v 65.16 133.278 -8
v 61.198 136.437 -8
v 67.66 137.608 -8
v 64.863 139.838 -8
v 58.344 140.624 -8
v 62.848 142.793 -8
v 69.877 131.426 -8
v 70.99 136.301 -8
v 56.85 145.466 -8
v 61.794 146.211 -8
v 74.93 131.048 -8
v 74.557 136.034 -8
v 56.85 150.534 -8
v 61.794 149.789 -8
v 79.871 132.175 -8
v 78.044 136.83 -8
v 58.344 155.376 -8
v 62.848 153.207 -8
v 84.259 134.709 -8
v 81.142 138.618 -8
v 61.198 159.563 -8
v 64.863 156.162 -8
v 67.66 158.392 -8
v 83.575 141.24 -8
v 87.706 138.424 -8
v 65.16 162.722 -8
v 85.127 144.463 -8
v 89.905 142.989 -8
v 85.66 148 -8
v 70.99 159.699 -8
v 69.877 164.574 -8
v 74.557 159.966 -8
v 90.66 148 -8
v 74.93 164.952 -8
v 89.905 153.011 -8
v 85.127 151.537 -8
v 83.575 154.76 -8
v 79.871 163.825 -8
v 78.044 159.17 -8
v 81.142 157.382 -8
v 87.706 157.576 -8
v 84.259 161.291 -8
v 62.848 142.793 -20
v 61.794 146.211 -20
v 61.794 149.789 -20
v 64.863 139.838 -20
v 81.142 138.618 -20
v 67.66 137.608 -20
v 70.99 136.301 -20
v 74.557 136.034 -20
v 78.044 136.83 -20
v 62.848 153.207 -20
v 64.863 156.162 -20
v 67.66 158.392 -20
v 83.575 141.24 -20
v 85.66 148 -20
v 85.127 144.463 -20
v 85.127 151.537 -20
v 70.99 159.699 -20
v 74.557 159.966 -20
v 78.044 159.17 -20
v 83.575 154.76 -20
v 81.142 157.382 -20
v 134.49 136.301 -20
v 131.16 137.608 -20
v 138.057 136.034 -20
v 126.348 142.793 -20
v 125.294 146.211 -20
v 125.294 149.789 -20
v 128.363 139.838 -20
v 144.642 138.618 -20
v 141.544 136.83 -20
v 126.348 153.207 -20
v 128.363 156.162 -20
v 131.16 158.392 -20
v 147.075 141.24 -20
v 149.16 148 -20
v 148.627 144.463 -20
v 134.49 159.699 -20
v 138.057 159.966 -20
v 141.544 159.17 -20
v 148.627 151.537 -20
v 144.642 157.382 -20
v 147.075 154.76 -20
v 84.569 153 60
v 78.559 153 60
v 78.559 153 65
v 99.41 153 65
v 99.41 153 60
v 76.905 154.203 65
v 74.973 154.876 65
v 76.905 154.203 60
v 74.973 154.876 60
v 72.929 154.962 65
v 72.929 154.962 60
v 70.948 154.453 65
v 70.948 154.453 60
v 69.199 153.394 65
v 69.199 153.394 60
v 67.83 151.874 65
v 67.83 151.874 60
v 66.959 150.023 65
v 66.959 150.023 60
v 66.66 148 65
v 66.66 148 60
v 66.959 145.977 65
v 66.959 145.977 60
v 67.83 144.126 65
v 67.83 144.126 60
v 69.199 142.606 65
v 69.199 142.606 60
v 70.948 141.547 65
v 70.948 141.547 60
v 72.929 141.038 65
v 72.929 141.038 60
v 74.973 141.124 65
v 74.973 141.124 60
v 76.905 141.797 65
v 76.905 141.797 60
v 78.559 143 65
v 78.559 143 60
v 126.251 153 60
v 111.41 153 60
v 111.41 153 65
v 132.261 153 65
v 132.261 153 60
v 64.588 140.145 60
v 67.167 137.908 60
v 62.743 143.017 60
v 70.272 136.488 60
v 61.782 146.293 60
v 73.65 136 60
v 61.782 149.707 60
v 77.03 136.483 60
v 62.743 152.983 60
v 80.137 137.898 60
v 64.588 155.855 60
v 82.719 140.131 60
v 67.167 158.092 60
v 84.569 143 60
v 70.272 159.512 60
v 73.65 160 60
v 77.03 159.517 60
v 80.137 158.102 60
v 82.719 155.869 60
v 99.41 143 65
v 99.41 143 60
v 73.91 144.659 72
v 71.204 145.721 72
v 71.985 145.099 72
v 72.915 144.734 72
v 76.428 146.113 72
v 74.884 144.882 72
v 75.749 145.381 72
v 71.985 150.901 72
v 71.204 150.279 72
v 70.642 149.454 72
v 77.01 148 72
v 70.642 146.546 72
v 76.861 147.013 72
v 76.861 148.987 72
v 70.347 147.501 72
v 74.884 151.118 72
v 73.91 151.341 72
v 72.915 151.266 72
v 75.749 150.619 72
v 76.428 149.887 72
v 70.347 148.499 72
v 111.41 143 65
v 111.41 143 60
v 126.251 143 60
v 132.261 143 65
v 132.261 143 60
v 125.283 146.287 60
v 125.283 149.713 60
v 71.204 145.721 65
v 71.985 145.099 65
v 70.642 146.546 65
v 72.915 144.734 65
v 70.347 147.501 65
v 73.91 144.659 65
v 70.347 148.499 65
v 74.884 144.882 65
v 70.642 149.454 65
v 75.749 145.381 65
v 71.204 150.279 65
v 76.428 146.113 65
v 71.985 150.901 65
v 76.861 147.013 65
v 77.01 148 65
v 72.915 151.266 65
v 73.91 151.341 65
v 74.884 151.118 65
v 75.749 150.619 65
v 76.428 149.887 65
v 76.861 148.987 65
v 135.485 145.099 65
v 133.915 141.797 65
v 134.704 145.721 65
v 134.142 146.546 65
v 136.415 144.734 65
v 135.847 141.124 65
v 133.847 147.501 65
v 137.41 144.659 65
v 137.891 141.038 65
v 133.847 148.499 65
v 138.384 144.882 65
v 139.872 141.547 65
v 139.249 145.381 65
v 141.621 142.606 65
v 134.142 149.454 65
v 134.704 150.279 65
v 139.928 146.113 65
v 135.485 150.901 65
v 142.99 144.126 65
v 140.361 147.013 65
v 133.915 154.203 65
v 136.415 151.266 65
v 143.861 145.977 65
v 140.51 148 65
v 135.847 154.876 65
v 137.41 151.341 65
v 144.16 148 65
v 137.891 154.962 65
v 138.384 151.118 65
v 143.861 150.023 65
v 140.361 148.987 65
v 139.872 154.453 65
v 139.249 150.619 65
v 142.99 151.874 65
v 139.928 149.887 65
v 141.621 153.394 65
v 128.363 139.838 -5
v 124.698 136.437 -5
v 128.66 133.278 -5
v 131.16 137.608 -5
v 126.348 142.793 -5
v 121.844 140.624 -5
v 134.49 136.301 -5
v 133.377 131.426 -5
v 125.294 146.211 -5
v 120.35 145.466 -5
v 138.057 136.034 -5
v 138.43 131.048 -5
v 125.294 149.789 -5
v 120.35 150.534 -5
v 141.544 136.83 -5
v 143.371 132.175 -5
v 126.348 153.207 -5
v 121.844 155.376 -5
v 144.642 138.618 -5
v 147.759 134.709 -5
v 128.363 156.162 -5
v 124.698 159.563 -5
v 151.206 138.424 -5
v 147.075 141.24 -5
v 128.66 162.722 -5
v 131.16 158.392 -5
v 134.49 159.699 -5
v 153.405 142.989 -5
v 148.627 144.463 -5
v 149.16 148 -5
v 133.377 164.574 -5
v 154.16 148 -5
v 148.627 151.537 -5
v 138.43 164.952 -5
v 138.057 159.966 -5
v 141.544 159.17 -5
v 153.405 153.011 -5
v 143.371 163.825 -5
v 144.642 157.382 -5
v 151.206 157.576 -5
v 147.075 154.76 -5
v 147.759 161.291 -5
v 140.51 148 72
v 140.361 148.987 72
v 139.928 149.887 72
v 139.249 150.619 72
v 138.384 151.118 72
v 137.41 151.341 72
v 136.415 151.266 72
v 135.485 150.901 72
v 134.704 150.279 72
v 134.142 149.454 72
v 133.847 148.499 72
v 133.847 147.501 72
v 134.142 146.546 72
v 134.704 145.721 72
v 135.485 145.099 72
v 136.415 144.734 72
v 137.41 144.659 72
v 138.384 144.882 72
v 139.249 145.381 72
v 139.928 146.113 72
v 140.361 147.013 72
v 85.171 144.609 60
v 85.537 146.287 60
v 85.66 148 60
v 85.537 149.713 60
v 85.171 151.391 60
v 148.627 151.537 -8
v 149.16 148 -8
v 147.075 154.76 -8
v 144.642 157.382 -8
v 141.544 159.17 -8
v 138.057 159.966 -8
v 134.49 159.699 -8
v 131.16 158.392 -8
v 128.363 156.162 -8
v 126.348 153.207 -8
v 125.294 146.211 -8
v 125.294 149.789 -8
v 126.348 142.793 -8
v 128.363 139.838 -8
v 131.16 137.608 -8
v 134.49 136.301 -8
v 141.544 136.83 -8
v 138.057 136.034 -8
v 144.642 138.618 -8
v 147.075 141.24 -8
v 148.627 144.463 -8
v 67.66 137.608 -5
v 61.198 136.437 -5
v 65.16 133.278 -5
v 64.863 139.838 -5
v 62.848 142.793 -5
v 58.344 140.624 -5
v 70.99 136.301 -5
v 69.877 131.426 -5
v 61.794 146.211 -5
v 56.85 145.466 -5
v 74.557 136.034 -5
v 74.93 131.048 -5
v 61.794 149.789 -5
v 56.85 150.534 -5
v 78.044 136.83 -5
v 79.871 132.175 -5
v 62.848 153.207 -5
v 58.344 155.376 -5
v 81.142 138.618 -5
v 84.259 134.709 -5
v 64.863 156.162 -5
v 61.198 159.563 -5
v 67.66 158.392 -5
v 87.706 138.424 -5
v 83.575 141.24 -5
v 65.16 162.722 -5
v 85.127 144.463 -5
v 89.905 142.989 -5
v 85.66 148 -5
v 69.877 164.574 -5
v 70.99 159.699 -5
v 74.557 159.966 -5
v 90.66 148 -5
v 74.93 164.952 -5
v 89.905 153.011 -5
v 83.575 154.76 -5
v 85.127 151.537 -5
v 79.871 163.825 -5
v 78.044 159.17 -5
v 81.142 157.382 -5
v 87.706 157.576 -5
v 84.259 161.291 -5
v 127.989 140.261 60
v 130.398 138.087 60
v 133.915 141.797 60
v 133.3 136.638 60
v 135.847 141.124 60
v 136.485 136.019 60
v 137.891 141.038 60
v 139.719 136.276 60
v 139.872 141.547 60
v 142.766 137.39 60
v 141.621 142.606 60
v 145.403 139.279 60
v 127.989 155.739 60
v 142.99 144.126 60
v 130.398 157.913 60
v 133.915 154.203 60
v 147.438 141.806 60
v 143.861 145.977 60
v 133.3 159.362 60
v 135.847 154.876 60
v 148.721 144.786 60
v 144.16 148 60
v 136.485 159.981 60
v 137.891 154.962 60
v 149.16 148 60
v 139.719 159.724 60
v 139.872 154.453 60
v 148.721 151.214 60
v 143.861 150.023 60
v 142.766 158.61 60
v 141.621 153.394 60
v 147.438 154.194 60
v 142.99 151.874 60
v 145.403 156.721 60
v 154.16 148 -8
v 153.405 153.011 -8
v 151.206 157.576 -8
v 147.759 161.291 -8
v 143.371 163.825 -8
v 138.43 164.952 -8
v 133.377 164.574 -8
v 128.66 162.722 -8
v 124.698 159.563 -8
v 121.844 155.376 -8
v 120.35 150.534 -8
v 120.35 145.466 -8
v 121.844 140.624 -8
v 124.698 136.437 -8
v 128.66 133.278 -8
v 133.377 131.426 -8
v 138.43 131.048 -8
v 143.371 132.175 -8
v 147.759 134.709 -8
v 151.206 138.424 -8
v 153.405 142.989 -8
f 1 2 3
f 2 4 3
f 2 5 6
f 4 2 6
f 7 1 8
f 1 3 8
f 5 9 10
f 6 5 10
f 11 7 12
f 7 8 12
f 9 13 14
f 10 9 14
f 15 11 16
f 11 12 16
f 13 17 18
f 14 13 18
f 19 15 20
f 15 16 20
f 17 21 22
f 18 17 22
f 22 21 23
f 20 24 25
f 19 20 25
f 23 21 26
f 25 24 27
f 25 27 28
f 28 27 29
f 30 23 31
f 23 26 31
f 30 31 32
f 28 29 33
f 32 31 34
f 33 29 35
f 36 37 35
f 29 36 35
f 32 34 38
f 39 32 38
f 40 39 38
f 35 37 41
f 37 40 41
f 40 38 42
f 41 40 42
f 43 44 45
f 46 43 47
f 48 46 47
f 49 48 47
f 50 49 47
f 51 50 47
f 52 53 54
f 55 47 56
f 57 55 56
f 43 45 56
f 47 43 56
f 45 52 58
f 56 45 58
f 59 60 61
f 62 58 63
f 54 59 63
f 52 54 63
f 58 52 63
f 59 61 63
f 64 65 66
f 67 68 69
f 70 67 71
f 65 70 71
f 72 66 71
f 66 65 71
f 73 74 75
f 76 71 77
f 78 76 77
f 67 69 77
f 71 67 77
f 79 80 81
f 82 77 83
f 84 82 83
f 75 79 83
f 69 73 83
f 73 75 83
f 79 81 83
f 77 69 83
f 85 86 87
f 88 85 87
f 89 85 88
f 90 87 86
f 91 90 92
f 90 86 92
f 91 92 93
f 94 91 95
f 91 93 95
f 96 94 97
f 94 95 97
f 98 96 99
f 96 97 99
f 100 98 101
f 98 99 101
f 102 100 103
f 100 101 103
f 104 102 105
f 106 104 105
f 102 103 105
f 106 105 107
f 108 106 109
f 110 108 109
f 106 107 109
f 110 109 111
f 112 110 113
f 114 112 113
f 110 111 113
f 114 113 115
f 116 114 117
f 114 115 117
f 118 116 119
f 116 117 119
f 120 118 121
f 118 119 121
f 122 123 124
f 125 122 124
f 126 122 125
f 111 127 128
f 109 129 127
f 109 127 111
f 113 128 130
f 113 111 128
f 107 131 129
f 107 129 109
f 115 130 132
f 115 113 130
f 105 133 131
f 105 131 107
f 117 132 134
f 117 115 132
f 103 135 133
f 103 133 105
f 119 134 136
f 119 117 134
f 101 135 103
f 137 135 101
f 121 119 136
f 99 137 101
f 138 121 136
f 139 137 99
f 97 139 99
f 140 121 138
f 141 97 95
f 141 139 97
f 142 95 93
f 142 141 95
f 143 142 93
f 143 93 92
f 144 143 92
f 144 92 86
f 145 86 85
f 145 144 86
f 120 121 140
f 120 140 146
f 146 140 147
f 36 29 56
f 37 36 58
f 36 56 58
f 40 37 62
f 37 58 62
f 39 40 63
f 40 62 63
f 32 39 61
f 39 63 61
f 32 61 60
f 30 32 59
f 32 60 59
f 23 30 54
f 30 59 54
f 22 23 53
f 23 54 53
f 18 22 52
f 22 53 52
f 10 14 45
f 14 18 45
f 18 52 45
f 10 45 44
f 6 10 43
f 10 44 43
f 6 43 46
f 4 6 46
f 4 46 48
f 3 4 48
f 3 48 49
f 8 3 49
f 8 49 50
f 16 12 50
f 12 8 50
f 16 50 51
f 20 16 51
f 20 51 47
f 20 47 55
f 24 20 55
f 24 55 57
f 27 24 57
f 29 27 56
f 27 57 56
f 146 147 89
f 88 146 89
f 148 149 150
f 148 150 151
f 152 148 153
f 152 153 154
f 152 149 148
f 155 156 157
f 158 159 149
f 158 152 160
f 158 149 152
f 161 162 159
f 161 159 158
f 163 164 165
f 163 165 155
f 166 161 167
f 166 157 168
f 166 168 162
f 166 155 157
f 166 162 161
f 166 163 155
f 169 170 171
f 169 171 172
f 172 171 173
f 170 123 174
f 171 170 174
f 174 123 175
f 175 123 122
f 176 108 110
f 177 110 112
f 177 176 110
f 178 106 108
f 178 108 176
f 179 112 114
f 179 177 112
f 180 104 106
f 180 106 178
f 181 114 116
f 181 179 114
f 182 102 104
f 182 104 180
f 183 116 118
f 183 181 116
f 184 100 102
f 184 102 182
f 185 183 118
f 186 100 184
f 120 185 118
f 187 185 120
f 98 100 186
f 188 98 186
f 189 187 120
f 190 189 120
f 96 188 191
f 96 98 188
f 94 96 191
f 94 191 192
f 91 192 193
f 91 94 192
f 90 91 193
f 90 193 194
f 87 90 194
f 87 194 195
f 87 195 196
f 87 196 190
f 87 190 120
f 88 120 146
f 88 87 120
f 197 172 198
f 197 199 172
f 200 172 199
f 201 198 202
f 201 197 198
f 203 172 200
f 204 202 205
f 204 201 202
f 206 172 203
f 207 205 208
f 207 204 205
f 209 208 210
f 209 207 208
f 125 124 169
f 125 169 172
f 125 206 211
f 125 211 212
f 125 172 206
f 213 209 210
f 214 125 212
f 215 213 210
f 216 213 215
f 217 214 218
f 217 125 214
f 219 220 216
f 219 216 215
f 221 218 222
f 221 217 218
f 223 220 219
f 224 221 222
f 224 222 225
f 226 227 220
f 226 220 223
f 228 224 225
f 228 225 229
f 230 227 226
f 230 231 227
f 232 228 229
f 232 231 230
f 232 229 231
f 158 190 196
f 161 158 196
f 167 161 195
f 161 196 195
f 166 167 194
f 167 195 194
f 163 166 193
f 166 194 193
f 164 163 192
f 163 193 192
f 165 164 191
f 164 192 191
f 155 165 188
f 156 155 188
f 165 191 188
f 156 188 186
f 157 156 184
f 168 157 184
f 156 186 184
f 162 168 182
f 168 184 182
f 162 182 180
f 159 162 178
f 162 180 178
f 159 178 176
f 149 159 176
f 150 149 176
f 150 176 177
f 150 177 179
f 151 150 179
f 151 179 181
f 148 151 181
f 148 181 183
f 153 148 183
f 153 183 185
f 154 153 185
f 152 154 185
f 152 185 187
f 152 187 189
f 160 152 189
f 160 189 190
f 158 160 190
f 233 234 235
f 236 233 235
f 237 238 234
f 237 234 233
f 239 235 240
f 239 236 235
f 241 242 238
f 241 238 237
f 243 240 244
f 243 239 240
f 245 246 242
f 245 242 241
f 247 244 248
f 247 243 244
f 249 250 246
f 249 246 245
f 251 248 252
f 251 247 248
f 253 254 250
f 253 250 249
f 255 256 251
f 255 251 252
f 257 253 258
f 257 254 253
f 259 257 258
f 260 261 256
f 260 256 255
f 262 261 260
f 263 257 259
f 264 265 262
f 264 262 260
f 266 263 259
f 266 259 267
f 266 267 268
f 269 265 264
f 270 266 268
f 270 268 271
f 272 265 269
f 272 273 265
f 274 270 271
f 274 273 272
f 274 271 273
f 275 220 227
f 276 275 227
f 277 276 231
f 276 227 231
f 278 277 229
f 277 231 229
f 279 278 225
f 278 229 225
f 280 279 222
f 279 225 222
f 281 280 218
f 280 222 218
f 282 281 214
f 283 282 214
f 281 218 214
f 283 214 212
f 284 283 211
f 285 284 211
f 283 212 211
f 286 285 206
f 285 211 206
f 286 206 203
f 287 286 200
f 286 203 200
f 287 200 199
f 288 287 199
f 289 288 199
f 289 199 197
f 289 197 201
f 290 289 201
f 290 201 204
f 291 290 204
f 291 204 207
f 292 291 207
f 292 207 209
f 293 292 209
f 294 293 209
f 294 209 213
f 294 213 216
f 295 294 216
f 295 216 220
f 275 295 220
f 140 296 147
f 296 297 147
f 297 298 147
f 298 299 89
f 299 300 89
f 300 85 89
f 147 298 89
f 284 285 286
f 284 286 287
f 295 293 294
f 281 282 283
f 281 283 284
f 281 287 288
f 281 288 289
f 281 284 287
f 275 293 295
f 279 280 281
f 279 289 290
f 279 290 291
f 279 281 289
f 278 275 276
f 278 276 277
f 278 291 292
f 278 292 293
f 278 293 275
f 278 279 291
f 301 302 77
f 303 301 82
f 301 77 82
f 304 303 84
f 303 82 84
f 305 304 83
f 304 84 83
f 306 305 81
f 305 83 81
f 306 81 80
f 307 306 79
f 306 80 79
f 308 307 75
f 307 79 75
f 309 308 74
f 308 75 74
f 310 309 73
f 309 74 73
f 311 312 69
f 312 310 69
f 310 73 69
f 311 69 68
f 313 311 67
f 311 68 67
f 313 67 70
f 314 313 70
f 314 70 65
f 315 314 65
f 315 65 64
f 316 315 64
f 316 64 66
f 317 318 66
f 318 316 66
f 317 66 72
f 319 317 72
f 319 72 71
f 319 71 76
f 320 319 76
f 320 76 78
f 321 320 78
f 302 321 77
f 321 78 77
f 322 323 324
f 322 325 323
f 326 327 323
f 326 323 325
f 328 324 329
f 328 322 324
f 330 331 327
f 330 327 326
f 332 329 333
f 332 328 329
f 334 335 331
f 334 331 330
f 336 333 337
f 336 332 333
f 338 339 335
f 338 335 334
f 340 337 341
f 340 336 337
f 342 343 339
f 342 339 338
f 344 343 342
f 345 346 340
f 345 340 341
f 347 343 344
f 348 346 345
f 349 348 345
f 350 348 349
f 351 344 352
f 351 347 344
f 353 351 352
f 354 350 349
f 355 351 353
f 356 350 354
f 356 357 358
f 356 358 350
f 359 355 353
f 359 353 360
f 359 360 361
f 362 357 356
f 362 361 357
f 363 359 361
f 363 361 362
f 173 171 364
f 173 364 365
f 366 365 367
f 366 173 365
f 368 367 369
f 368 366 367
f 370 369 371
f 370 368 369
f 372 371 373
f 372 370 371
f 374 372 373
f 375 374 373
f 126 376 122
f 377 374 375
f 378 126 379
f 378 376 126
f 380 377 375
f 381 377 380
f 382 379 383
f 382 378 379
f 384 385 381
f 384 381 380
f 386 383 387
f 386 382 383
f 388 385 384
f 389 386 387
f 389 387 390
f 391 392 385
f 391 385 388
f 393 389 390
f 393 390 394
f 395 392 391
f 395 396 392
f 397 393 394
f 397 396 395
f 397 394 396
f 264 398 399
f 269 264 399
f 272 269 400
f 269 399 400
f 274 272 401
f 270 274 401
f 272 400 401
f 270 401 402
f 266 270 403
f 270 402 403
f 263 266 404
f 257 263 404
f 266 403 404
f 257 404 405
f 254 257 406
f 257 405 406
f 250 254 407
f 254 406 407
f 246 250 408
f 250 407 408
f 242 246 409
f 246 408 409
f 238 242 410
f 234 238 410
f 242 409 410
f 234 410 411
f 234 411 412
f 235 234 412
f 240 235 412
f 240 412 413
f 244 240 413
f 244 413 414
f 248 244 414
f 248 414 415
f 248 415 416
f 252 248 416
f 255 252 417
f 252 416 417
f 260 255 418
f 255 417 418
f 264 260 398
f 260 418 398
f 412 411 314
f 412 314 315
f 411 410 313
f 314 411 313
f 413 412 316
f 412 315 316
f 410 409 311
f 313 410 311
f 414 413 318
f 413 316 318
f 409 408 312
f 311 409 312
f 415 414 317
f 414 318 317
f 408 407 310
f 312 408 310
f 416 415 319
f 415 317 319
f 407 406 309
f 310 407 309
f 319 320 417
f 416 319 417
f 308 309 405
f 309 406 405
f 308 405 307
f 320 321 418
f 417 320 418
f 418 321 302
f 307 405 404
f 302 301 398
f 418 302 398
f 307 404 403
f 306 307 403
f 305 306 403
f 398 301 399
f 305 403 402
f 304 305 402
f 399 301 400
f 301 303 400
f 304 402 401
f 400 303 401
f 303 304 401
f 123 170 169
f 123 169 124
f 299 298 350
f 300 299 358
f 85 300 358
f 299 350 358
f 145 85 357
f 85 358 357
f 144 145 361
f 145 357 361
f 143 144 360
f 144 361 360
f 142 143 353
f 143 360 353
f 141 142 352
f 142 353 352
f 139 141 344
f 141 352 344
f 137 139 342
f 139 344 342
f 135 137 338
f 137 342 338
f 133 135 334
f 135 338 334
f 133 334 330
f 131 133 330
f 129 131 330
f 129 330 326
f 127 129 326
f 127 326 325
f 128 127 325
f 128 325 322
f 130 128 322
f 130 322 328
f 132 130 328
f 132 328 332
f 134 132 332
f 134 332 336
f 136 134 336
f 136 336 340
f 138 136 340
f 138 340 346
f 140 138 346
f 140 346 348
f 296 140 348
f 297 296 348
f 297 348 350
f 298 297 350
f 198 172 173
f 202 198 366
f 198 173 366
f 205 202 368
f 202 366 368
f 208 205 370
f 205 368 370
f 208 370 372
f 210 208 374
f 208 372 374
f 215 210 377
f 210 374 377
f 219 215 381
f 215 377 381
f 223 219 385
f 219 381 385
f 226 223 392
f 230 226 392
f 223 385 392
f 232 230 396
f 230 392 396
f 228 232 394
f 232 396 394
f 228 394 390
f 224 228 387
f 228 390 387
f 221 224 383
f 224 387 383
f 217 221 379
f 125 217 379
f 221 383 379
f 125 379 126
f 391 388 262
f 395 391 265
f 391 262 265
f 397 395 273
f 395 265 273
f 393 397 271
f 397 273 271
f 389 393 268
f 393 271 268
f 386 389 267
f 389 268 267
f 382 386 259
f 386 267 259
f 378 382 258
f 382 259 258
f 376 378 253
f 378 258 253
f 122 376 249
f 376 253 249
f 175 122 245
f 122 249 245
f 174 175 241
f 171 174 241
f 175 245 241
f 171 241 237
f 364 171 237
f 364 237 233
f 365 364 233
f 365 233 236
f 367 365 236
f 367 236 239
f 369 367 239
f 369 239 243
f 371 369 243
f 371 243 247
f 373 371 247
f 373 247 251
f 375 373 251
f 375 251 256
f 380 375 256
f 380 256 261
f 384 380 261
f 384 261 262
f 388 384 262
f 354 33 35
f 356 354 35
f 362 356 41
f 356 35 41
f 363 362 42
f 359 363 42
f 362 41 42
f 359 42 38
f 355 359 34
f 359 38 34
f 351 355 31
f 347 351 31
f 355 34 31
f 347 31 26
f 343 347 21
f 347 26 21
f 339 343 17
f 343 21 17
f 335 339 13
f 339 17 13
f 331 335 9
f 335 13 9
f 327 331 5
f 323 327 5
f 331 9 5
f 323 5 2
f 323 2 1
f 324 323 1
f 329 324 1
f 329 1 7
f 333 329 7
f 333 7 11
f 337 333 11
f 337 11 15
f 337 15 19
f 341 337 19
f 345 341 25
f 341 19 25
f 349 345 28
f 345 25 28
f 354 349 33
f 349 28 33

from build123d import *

# Parameters (mm, degrees)
CYLINDER116_R     = 7
CYLINDER116_DEPTH = 5
CYLINDER117_R     = 3.35
CYLINDER117_DEPTH = 9
CYLINDER132_R     = 17
CYLINDER132_DEPTH = 3
CYLINDER131_R     = 12
CYLINDER131_DEPTH = 80
CYLINDER133_R     = 7
CYLINDER133_DEPTH = 5
BOX024_W          = 25.75
BOX024_H          = 10
BOX024_DEPTH      = 5
CYLINDER134_R     = 3.35
CYLINDER134_DEPTH = 9
CYLINDER100_R     = 17
CYLINDER100_DEPTH = 3
CYLINDER095_R     = 12
CYLINDER095_DEPTH = 80
BOX020_W          = 25.75
BOX020_H          = 10
BOX020_DEPTH      = 5


with BuildPart() as bowtiebarround1:
    # Cylinder116 → Cylinder116 (new body)
    with BuildSketch(Plane(origin=(73.66, 148, 60), x_dir=(1, 0, 0), z_dir=(0, 0, 1))):
        Circle(CYLINDER116_R)
    extrude(amount=CYLINDER116_DEPTH)


with BuildPart() as bowtiebarmount003:
    # Cylinder117 → Cylinder117 (new body)
    with BuildSketch(Plane(origin=(73.66, 148, 63), x_dir=(1, 0, 0), z_dir=(0, 0, 1))):
        Circle(CYLINDER117_R)
    extrude(amount=CYLINDER117_DEPTH)


with BuildPart() as ft1flange001:
    # Cylinder132 → Cylinder132 (new body)
    with BuildSketch(Plane(origin=(73.66, 148, -8), x_dir=(1, 0, 0), z_dir=(0, 0, 1))):
        Circle(CYLINDER132_R)
    extrude(amount=CYLINDER132_DEPTH)


with BuildPart() as ft002:
    # Cylinder131 → Cylinder131 (new body)
    with BuildSketch(Plane(origin=(73.66, 148, -20), x_dir=(1, 0, 0), z_dir=(0, 0, 1))):
        Circle(CYLINDER131_R)
    extrude(amount=CYLINDER131_DEPTH)

    # Fusion052: union FT1flange001
    add(ft1flange001.part)


with BuildPart() as ft002_1:
    # Fusion052 placement: moved
    add(ft002.part.moved(Location((63.5, 0, 0))))


with BuildPart() as bowtiebarround2:
    # Cylinder133 → Cylinder133 (new body)
    with BuildSketch(Plane(origin=(137.16, 148, 60), x_dir=(1, 0, 0), z_dir=(0, 0, 1))):
        Circle(CYLINDER133_R)
    extrude(amount=CYLINDER133_DEPTH)


with BuildPart() as bowtiebar002:
    # Box024 → Box024 (new body)
    with BuildSketch(Plane(origin=(111.41, 143, 60), x_dir=(1, 0, 0), z_dir=(0, 0, 1))):
        with Locations((12.875, 5)):
            Rectangle(BOX024_W, BOX024_H)
    extrude(amount=BOX024_DEPTH)


with BuildPart() as bowtiebarmount1:
    # Cylinder134 → Cylinder134 (new body)
    with BuildSketch(Plane(origin=(137.16, 148, 63), x_dir=(1, 0, 0), z_dir=(0, 0, 1))):
        Circle(CYLINDER134_R)
    extrude(amount=CYLINDER134_DEPTH)


with BuildPart() as ft1flange:
    # Cylinder100 → Cylinder100 (new body)
    with BuildSketch(Plane(origin=(73.66, 148, -8), x_dir=(1, 0, 0), z_dir=(0, 0, 1))):
        Circle(CYLINDER100_R)
    extrude(amount=CYLINDER100_DEPTH)


with BuildPart() as ft1:
    # Cylinder095 → Cylinder095 (new body)
    with BuildSketch(Plane(origin=(73.66, 148, -20), x_dir=(1, 0, 0), z_dir=(0, 0, 1))):
        Circle(CYLINDER095_R)
    extrude(amount=CYLINDER095_DEPTH)

    # Fusion043: union FT1flange
    add(ft1flange.part)


with BuildPart() as fusion054:
    # Box020 → Box020 (new body)
    with BuildSketch(Plane(origin=(73.66, 143, 60), x_dir=(1, 0, 0), z_dir=(0, 0, 1))):
        with Locations((12.875, 5)):
            Rectangle(BOX020_W, BOX020_H)
    extrude(amount=BOX020_DEPTH)

    # Fusion054: union BowTieBarRound1, BowTieBarMount003, FT002, BowTieBarRound2, BowTieBar002, BowTieBarMount1, FT1
    add(bowtiebarround1.part)
    add(bowtiebarmount003.part)
    add(ft002_1.part)
    add(bowtiebarround2.part)
    add(bowtiebar002.part)
    add(bowtiebarmount1.part)
    add(ft1.part)


solid = fusion054.part
